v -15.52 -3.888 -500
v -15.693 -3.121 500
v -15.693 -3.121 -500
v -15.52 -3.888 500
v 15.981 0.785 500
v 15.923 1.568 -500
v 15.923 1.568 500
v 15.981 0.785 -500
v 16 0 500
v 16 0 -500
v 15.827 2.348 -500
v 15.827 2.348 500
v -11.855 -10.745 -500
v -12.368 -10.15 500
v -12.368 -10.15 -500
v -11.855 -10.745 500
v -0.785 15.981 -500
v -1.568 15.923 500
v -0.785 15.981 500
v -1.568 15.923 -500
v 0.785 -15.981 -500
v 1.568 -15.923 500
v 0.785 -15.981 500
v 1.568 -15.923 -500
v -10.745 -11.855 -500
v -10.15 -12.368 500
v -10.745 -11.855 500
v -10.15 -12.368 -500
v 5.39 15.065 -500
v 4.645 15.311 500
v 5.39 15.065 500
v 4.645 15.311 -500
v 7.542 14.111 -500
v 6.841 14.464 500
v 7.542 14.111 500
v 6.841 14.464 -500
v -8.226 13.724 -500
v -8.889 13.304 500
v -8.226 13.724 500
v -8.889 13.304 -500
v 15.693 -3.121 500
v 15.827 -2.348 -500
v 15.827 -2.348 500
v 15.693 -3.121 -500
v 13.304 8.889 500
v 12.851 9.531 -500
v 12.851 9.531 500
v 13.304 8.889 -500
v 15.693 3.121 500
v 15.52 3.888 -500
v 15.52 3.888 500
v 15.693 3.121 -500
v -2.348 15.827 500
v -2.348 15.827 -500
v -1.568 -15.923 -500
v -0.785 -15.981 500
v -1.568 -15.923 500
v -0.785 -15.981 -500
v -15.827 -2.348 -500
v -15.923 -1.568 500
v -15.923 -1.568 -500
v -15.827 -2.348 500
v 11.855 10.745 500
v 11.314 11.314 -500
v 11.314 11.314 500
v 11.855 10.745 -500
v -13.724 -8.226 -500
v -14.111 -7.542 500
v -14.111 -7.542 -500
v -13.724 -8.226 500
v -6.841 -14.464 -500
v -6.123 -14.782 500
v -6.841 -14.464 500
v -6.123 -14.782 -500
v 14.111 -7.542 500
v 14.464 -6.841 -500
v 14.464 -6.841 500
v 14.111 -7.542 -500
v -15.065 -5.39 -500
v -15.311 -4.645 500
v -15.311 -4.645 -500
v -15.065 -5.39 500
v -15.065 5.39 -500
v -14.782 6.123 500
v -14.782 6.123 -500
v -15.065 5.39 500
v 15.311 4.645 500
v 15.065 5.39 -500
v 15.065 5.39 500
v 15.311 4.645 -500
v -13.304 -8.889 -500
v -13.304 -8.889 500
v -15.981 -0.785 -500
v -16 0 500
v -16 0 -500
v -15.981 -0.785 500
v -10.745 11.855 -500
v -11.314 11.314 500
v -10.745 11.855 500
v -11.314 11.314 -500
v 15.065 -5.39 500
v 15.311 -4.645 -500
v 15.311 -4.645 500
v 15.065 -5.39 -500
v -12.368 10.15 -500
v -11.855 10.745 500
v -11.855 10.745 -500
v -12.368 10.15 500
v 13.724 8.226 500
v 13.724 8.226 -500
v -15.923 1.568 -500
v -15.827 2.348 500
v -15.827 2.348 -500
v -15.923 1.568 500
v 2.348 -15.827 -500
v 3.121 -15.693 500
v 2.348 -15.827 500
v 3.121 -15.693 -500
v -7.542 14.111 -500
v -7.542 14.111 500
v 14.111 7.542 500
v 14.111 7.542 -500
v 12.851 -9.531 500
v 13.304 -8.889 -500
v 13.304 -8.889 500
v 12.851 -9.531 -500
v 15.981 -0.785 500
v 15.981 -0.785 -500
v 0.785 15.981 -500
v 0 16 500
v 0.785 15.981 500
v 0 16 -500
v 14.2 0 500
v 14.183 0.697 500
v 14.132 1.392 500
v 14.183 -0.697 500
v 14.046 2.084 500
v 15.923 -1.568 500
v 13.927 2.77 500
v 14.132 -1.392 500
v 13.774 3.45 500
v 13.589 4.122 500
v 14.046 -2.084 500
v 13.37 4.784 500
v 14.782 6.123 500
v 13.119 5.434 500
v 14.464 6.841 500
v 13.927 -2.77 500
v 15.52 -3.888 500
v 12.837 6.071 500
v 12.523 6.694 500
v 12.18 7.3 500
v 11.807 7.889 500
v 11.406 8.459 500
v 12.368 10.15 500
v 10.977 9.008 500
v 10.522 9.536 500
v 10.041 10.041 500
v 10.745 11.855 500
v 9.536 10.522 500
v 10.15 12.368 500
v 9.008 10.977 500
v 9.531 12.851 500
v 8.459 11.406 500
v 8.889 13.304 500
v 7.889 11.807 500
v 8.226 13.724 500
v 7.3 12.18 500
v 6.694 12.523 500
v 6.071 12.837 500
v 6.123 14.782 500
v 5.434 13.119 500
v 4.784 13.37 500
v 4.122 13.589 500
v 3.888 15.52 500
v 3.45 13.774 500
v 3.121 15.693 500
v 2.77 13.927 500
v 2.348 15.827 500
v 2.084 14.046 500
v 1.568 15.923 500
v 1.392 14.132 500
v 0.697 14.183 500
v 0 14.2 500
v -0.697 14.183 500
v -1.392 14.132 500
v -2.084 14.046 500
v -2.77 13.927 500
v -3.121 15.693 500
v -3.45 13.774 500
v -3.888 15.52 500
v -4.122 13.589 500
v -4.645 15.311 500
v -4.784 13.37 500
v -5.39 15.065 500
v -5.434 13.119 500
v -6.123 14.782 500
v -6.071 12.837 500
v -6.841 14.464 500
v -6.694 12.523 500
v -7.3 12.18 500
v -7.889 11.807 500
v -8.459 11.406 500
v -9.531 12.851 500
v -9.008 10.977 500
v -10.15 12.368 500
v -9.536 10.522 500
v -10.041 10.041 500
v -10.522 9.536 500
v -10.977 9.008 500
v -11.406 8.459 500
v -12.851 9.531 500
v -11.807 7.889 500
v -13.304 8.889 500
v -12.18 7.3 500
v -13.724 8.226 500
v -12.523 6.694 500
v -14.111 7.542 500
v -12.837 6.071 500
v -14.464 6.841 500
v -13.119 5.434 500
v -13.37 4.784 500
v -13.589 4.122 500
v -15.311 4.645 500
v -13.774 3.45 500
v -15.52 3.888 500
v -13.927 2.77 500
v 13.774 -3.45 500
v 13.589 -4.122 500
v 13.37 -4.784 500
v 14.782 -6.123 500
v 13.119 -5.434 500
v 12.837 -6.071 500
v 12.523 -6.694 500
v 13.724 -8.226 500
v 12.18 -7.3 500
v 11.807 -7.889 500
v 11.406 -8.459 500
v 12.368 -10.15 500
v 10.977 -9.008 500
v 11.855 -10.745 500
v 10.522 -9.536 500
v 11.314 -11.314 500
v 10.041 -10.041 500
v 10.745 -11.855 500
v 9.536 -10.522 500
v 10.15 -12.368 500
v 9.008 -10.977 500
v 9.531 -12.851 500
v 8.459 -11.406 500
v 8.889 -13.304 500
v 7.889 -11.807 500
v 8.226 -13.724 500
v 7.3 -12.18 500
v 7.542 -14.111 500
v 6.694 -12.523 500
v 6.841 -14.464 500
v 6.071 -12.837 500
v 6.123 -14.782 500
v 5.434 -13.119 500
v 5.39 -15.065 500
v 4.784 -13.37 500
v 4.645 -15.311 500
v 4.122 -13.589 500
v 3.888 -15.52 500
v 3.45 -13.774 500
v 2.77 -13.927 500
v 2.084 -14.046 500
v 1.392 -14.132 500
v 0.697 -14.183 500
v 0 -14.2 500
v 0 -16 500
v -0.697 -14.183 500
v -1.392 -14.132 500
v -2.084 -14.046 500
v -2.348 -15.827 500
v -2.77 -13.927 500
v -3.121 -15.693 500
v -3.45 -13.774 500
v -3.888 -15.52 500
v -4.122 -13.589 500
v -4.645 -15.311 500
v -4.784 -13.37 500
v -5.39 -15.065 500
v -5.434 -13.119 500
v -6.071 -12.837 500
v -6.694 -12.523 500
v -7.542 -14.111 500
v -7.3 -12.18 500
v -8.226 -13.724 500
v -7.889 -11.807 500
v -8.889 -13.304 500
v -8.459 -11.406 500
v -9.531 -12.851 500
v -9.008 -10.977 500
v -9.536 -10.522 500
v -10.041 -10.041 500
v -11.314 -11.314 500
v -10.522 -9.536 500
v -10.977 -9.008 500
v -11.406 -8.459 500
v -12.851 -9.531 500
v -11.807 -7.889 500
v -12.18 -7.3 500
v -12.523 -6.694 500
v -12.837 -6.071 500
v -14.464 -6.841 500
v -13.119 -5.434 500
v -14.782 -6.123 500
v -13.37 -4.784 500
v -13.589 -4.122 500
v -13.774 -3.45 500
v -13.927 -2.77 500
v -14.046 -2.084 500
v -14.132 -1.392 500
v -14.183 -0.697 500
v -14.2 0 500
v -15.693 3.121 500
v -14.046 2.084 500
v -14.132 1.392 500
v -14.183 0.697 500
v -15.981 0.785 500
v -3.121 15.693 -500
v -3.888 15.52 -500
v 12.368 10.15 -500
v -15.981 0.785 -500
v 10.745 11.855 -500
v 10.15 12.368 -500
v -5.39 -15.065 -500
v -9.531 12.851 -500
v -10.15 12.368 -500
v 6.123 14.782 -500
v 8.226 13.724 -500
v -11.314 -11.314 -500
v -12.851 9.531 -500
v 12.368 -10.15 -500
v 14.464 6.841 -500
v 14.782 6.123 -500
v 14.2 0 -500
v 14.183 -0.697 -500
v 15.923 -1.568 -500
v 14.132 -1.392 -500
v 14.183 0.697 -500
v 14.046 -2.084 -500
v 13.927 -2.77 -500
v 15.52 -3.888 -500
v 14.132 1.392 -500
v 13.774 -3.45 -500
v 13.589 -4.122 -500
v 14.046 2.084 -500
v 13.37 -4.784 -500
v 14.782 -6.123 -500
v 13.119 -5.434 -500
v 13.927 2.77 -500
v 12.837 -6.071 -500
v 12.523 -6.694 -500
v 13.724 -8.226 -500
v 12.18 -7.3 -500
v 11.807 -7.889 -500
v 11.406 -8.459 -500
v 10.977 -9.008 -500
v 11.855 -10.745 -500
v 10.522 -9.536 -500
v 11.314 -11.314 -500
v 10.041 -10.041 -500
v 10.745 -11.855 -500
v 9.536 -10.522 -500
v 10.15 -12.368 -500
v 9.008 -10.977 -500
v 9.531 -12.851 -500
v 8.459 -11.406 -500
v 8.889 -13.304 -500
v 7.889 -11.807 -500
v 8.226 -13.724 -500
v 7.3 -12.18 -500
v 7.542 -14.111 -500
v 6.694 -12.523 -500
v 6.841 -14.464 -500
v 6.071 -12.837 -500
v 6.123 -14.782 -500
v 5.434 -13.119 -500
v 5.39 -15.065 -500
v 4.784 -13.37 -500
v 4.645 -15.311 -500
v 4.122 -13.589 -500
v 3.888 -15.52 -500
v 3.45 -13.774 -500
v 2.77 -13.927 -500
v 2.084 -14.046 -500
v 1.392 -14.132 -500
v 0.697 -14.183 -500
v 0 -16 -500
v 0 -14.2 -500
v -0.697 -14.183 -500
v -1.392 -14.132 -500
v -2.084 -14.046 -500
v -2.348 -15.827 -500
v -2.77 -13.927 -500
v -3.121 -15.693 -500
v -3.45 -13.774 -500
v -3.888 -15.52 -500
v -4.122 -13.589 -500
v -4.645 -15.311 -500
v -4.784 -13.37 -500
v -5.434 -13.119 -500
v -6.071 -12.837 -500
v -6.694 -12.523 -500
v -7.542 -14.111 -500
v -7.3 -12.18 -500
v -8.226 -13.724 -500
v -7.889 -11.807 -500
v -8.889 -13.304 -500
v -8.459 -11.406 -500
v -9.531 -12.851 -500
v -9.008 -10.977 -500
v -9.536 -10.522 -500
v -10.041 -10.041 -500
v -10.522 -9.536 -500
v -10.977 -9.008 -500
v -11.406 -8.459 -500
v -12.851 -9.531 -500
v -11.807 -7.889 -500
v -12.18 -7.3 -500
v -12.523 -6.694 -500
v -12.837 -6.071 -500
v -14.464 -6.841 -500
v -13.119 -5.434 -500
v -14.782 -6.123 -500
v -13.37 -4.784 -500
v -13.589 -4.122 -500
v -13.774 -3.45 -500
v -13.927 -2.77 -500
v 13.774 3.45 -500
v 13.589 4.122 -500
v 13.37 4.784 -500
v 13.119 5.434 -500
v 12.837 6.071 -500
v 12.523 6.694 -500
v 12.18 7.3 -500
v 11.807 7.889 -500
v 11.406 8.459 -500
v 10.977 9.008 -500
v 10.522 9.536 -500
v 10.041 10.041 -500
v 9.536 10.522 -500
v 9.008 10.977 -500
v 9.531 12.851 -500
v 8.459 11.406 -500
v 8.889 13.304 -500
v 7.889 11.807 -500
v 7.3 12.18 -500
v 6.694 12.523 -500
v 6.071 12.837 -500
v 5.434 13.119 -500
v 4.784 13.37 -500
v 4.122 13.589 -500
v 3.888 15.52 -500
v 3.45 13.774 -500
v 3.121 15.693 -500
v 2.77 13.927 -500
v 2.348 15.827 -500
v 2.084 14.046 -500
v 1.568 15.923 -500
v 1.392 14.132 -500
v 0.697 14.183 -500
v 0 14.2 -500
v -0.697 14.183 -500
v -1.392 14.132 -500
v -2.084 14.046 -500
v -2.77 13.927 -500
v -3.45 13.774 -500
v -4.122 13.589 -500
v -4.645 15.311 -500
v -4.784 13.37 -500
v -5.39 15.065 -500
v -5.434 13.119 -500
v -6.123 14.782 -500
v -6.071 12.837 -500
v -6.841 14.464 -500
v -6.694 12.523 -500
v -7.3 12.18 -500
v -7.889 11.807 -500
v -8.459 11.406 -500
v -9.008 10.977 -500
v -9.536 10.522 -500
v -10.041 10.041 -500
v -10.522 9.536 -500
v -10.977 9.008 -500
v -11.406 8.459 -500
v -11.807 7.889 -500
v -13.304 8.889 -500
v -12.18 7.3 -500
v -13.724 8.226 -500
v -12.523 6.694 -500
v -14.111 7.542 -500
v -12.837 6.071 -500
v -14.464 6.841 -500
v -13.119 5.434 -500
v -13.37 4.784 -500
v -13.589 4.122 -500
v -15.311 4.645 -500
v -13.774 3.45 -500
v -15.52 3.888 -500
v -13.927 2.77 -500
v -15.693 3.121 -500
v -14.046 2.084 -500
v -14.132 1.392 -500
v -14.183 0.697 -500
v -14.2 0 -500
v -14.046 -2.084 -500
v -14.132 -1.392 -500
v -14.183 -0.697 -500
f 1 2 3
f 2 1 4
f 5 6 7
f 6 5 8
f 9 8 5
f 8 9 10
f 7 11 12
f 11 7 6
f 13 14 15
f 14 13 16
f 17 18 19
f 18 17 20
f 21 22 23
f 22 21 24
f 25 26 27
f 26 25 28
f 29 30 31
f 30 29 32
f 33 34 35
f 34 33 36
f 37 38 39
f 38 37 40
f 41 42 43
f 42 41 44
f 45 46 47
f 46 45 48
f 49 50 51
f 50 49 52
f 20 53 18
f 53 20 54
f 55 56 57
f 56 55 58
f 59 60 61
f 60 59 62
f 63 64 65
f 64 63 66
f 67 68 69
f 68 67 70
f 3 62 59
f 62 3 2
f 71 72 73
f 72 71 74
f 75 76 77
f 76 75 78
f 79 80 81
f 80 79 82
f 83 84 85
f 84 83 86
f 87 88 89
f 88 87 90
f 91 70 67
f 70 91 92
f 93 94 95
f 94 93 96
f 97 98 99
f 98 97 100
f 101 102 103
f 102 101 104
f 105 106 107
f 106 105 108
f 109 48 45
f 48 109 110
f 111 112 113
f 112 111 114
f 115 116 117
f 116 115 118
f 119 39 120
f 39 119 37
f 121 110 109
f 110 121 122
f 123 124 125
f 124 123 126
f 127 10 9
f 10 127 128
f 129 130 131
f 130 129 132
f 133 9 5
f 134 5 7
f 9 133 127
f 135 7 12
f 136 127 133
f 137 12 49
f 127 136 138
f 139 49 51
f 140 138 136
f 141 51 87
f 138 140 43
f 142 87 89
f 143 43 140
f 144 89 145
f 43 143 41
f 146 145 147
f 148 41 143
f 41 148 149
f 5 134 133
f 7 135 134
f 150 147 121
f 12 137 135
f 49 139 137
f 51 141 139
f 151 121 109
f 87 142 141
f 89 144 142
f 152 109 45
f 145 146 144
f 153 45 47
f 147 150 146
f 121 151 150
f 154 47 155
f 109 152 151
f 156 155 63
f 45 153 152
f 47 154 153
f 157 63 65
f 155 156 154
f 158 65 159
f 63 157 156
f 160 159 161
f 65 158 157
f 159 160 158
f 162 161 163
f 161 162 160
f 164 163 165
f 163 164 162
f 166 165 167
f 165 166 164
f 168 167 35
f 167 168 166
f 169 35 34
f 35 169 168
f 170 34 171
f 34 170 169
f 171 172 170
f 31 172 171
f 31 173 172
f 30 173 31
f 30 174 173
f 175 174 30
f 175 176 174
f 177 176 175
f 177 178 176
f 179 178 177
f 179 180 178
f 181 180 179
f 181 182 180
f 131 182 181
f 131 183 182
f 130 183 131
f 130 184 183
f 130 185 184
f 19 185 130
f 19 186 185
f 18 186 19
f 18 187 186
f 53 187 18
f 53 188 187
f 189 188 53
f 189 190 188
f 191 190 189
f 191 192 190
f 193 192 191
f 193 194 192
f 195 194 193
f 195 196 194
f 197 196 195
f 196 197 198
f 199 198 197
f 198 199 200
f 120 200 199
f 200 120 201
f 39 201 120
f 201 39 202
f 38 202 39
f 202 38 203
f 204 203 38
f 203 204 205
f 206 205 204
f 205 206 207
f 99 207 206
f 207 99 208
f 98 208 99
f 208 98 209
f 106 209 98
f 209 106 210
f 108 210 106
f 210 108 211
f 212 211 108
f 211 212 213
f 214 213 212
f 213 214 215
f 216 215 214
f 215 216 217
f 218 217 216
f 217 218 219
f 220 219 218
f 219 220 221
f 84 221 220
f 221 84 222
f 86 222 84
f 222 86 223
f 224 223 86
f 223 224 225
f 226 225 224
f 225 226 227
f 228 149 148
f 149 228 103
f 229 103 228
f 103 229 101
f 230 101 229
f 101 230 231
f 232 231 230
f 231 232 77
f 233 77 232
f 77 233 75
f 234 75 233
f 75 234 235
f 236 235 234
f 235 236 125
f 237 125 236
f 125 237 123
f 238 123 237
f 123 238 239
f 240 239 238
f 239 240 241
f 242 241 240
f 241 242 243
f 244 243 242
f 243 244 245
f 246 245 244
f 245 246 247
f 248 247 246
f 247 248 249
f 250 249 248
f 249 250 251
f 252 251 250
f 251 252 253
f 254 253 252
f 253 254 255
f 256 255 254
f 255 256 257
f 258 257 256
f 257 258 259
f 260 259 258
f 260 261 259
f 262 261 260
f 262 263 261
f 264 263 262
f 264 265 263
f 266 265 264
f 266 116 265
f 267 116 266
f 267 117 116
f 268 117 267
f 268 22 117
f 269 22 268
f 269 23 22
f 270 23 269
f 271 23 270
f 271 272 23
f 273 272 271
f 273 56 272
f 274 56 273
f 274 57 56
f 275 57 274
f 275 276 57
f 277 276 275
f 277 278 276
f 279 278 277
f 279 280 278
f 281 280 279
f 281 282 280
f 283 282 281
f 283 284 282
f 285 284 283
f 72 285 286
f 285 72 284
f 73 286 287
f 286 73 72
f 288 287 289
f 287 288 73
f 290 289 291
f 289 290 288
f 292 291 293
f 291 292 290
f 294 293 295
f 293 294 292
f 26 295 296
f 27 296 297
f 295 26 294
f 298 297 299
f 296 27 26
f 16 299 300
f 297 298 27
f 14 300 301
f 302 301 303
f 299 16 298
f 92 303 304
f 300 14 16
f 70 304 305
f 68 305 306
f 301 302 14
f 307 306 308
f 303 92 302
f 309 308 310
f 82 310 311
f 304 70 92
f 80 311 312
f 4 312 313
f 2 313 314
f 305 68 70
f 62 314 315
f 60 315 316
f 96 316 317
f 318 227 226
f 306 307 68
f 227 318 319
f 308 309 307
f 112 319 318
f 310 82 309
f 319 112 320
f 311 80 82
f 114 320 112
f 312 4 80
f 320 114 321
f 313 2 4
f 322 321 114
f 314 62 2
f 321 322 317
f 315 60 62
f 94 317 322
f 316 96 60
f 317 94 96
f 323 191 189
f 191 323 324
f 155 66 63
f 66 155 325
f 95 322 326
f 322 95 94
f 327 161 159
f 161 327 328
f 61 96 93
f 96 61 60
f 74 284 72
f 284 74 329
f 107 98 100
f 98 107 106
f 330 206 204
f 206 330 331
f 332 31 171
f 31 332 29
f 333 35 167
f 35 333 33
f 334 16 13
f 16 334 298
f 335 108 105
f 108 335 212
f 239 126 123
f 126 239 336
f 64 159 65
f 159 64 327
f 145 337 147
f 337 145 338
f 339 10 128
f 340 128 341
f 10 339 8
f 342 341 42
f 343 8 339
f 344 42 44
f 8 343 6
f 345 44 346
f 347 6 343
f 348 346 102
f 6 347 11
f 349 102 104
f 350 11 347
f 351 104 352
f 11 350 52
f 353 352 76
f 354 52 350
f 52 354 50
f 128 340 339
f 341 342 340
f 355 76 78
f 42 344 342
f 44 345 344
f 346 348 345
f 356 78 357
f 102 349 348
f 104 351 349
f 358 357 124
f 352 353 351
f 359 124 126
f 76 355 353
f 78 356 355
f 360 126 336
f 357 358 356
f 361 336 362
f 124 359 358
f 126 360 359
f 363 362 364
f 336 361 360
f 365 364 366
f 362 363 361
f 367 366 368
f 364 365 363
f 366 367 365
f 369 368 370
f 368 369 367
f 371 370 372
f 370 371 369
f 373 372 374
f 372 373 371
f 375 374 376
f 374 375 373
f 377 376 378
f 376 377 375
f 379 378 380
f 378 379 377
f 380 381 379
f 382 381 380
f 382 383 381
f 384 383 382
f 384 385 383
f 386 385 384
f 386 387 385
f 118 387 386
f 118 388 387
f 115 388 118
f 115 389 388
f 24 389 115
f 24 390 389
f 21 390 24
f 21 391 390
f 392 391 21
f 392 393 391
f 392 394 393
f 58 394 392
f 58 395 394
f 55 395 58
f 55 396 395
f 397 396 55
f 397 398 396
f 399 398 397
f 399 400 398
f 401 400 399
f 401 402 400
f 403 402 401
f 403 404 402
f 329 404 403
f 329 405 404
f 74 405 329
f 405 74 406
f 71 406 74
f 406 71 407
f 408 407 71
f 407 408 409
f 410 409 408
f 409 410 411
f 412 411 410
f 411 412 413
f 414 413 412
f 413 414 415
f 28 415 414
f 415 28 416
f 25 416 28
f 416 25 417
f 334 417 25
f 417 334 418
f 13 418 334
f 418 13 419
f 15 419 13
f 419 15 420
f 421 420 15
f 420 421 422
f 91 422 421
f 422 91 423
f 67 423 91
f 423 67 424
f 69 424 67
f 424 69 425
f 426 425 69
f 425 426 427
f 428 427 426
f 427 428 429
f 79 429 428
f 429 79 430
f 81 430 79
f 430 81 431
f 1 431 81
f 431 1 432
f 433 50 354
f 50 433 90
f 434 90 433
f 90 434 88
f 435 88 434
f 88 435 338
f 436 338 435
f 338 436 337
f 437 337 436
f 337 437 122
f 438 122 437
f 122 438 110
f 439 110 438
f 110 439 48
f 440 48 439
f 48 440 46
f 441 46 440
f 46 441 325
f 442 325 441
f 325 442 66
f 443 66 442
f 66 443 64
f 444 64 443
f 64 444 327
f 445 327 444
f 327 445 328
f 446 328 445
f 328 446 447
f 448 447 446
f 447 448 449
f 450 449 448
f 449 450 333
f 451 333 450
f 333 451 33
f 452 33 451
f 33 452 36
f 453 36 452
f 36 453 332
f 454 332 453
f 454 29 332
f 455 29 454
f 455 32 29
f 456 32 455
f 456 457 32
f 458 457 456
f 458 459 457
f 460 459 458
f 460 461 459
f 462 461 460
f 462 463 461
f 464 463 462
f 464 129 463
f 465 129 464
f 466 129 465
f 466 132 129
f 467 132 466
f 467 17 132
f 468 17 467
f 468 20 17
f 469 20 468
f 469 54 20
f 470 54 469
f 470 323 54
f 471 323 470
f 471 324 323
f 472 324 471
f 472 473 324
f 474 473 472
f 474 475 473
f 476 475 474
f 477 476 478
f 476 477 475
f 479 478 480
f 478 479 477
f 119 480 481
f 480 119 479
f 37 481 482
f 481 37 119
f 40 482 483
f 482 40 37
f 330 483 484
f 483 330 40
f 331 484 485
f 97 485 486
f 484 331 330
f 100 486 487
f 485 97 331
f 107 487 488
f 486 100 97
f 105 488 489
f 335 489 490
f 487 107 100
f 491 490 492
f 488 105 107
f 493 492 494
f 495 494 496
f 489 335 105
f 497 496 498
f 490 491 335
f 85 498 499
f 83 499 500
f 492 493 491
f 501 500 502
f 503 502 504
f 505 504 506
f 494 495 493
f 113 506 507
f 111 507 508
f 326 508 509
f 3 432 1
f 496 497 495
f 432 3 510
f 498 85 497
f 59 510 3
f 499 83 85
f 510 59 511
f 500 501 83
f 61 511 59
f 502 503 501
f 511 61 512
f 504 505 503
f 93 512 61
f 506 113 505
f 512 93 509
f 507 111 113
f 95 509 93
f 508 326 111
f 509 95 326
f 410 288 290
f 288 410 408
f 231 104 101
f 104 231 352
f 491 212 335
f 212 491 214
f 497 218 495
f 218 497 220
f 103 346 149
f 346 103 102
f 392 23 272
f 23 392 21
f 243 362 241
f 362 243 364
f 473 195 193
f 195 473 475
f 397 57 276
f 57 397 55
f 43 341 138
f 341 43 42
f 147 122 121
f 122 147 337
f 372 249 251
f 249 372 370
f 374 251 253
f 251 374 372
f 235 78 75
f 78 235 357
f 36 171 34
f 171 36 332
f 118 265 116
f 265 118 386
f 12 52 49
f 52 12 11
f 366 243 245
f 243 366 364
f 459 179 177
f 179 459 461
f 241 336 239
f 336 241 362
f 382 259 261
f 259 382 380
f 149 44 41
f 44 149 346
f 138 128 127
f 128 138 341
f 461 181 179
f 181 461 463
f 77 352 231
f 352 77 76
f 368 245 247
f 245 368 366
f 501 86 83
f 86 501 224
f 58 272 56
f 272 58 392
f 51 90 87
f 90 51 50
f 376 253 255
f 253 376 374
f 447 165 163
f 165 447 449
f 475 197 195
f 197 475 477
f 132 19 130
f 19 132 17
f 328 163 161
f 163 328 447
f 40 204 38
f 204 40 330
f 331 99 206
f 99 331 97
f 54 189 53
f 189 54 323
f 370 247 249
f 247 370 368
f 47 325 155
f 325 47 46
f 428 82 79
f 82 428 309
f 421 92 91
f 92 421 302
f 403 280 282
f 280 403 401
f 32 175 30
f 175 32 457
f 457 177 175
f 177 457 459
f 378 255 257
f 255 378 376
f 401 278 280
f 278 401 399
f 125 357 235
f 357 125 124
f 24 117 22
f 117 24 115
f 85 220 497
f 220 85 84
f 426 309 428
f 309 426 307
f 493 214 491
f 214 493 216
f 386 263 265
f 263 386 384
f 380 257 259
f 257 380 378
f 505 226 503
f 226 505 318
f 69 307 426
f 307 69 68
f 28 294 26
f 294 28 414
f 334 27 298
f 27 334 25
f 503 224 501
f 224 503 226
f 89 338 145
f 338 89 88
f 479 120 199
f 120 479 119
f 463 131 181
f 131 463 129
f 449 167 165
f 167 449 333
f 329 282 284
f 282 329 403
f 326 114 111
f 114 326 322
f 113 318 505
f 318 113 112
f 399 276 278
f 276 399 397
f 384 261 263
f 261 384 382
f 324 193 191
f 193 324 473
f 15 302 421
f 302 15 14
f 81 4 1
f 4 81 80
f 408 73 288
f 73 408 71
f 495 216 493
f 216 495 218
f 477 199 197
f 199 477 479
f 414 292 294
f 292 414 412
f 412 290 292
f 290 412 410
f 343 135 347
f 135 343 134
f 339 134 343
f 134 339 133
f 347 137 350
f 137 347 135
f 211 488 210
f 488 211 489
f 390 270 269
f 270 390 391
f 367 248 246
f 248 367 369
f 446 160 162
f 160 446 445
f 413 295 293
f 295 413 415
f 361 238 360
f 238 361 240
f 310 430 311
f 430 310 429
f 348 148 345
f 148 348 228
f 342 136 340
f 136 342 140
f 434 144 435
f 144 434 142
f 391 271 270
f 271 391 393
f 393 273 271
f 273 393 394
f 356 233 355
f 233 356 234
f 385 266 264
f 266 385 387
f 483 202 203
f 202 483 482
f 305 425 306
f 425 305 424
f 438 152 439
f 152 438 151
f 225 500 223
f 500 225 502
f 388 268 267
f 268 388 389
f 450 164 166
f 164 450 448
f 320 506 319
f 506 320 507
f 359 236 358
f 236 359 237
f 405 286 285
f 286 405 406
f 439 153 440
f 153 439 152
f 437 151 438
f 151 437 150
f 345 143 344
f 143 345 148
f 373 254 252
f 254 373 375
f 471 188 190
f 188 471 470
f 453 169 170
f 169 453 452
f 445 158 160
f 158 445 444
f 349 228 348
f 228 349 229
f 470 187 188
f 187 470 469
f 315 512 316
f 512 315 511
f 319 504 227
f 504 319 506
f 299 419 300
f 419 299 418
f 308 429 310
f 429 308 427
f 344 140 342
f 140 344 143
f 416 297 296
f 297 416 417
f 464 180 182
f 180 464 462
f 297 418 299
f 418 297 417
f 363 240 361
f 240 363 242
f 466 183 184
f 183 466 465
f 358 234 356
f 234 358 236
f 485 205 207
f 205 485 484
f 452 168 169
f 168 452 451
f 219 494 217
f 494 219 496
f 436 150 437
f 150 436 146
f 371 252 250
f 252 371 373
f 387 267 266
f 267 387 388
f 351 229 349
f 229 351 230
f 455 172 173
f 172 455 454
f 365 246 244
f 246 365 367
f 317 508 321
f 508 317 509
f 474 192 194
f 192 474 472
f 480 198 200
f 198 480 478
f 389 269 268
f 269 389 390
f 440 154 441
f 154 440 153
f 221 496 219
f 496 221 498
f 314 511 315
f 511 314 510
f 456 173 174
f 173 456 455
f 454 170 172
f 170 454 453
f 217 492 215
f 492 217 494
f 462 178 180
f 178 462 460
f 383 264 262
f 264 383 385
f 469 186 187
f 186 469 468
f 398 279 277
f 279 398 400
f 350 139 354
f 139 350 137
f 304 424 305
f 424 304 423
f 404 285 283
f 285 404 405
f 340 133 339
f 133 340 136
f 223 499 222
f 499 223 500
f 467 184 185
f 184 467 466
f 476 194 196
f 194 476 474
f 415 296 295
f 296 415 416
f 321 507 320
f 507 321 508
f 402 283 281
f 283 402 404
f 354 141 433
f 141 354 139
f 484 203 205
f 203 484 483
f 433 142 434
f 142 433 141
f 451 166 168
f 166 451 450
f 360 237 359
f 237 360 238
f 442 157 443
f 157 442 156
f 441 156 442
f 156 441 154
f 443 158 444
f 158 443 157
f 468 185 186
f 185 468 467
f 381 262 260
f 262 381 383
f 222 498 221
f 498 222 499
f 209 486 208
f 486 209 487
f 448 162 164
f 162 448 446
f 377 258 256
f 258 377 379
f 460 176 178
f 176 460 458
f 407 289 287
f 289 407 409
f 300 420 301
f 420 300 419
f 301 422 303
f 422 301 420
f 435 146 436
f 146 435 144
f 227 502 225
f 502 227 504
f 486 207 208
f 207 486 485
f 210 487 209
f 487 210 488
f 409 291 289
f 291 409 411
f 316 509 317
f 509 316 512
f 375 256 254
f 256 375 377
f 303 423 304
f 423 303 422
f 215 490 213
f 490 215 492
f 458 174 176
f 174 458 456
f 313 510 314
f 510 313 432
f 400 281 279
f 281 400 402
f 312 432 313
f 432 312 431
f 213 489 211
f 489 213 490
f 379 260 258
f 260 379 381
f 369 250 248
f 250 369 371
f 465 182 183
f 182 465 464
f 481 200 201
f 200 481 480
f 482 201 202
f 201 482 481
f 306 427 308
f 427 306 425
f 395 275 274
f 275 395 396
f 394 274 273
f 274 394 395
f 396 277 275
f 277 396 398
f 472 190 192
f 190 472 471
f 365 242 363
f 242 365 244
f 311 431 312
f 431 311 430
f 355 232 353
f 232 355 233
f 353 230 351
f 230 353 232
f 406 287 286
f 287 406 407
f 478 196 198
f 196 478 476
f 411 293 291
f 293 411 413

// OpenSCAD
$fn=128;

module ht_pipe(od=32, wall=1.8, length=1000) {
    difference() {
        cylinder(h=length, d=od, center=true);
        cylinder(h=length+2, d=od-2*wall, center=true);
    }
}

ht_pipe(od=32, wall=1.8, length=1000);
